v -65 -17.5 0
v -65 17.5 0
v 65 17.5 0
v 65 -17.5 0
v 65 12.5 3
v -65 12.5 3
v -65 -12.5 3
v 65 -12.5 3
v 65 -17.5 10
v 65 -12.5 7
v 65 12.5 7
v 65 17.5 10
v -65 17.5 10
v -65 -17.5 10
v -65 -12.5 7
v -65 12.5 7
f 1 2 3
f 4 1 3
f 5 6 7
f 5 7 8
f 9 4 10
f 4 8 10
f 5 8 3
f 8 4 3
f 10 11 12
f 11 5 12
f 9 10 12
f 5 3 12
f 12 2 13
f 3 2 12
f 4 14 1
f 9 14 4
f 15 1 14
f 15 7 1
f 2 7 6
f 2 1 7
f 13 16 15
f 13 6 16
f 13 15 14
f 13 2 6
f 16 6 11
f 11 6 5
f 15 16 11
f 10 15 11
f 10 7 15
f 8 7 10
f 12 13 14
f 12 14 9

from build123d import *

# Parameters (mm, degrees)
F0_W     = 130
F0_H     = 5
F0_H_2   = 25
F1_DEPTH = 3
F2_W     = 130
F2_H     = 5
F3_DEPTH = 7
F4_W     = 130
F4_H     = 5
F5_DEPTH = 4
F6_W     = 130
F6_H     = 3
F7_DEPTH = 30


with BuildPart() as f1:
    # F0 (on Top) → F1 (new body)
    with BuildSketch(Plane.XY):
        with Locations((0, 15)):
            Rectangle(F0_W, F0_H)
        Rectangle(F0_W, F0_H_2)
        with Locations((0, -15)):
            Rectangle(F0_W, F0_H)
    extrude(amount=F1_DEPTH)

    # F2 (on face) → F3 (join)
    with BuildSketch(Plane.XY.offset(3)):
        with Locations((0, 15)):
            Rectangle(F2_W, F2_H)
    extrude(amount=F3_DEPTH)

    # F4 (on face) → F5 (join)
    with BuildSketch(Plane.XY.offset(3)):
        with Locations((0, -15)):
            Rectangle(F4_W, F4_H)
    extrude(amount=F5_DEPTH)

    # F6 (on face) → F7 (join)
    with BuildSketch(Plane.XZ.offset(-12.5)):
        with Locations((0, 8.5)):
            Rectangle(F6_W, F6_H)
    extrude(amount=F7_DEPTH)


solid = f1.part
